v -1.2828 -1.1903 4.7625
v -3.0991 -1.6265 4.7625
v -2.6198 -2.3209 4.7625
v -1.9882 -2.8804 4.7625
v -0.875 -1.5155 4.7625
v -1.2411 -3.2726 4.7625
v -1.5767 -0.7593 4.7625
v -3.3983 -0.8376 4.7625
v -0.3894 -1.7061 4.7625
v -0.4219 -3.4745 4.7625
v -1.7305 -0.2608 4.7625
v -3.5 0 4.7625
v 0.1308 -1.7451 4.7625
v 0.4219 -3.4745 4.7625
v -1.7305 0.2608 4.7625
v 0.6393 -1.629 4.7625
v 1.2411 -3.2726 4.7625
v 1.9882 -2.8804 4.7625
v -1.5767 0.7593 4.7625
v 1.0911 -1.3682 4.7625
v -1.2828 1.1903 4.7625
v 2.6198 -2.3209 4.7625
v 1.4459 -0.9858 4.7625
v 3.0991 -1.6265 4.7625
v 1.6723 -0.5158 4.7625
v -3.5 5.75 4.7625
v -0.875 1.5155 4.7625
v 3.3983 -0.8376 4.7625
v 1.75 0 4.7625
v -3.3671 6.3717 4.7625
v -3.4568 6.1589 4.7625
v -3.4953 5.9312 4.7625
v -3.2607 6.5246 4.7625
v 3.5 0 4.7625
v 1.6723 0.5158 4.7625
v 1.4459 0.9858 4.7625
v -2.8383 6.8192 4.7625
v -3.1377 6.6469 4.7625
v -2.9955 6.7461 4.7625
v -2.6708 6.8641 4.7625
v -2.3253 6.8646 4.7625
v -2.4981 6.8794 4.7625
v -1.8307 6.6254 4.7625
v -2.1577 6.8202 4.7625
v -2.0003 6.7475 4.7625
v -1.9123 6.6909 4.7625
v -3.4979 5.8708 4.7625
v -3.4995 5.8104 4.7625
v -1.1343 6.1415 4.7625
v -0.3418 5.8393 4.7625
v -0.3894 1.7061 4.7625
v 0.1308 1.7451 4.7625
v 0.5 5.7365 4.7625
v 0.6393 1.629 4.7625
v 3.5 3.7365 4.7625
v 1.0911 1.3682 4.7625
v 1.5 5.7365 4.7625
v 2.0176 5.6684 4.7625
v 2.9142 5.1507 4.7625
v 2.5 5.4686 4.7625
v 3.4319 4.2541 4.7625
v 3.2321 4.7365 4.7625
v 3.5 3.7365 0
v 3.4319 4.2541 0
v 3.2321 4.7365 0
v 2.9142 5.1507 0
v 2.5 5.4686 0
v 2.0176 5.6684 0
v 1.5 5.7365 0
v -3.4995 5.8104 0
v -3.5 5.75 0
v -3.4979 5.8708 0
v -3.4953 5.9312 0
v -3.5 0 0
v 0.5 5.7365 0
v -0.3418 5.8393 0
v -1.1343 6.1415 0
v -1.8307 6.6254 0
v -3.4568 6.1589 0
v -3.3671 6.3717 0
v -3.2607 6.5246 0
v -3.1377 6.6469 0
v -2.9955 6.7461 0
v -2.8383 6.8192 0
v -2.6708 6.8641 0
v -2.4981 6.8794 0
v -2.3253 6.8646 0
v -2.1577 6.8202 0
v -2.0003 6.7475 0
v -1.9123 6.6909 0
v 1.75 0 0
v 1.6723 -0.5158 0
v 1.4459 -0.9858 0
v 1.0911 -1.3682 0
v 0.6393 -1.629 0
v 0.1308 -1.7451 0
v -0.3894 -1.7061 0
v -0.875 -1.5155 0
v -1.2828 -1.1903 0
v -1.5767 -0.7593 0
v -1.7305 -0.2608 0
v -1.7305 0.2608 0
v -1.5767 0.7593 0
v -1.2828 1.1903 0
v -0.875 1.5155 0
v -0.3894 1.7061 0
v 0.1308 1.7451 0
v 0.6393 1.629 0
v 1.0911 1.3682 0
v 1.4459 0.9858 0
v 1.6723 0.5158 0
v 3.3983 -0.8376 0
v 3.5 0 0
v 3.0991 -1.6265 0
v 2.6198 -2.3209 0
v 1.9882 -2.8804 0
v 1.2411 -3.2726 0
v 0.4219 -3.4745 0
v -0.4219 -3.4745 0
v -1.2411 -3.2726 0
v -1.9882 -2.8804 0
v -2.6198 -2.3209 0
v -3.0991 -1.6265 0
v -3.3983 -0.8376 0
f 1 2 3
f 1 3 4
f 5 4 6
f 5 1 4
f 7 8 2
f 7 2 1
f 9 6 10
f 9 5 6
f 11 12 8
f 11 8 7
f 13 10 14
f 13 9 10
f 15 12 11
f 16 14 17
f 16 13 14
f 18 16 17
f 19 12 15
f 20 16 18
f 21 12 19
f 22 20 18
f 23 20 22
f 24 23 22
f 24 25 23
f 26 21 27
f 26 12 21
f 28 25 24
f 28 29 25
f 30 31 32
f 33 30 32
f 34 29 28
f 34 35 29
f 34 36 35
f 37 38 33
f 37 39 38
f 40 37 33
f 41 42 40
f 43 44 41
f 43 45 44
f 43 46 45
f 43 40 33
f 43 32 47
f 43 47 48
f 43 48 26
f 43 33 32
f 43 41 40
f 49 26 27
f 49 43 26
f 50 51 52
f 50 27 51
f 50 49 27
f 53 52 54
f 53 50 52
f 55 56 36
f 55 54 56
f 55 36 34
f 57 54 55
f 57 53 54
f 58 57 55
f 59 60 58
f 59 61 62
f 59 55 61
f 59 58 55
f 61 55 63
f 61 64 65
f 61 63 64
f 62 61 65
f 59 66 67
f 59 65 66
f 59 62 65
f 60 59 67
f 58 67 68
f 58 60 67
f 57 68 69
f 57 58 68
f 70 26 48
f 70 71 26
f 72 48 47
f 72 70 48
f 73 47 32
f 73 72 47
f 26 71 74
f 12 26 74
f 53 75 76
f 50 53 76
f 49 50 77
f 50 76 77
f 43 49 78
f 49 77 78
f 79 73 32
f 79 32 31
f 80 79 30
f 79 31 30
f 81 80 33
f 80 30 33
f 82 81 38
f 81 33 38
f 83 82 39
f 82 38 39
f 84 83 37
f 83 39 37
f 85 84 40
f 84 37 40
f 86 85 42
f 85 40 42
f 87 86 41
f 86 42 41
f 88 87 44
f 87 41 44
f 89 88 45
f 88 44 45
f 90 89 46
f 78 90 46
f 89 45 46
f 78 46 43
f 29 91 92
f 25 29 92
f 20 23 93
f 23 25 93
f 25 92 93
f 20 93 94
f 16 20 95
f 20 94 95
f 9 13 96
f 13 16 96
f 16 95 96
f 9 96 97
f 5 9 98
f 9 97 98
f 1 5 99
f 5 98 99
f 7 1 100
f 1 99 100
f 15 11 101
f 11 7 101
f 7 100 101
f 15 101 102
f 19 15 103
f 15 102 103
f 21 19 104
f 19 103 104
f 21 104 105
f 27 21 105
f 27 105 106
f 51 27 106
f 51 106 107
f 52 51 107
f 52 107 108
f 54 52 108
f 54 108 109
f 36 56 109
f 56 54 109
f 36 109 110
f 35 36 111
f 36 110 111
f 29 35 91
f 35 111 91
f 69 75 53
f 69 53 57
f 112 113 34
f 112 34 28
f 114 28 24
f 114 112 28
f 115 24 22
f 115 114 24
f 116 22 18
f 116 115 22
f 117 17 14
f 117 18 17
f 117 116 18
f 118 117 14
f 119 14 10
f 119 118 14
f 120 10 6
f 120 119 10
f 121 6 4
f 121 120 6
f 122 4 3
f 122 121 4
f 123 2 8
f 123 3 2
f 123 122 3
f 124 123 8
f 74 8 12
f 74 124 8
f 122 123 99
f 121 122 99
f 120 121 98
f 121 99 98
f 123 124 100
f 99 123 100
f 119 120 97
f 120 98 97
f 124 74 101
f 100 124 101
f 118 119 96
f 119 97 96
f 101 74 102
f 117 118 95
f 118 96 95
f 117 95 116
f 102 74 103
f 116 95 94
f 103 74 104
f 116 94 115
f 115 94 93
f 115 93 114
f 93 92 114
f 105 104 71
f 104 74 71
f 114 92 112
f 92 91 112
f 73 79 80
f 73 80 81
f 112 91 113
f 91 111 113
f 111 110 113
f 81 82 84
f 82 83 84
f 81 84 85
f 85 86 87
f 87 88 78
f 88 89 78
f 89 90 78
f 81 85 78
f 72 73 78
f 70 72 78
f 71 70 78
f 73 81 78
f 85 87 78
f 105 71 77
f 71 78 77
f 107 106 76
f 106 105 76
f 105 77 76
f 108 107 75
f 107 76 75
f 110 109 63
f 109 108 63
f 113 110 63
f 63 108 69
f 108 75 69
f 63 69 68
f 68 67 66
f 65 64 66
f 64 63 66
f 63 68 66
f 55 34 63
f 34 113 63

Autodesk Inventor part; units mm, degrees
ref_plane "YZ Plane" through (0, 0, 0) normal (1, 0, 0) x (0, 1, 0)
ref_plane "XZ Plane" through (0, 0, 0) normal (0, 1, 0) x (-1, 0, 0)
ref_plane "XY Plane" through (0, 0, 0) normal (0, 0, 1) x (1, 0, 0)
sketch "Sketch1" plane through (0, 0, 0) normal (0, 0, 1) x (1, 0, 0)
  circle A0 centre (0, 0) radius 1.75
  circle A1 centre (0, 0) radius 3.5
  circle A2 centre (0, 0) radius 5.75 construction
  line L0 (0, 0) -> (0, 5.75) construction
  circle A3 centre (0.5, 9.2365) radius 3.5
  line L1 (0, 0) -> (0, 5.75) construction
  line L2 (3.5, 0) -> (3.5, 5.75)
  line L3 (-3.5, 5.75) -> (-3.5, 0)
  arc A4 (-3.5, 0) -> (3.5, 0) centre (0, 0) ccw
  arc A5 (3.5, 5.75) -> (-1.9961, 2.875) centre (0, 5.75) ccw
  arc A6 (-3.4062, 0.805) -> (-3.4062, 4.945) centre (-12.1649, 2.875) ccw
  line L4 (0.5, 5.7365) -> (3.5, 5.7365)
  point P0 (0, 2.875)
  point P1 (-3.4345, 6.424)
  point P2 (3.5, 0)
  point P3 (3.244, 7.0639)
  point P4 (-3.5, 0)
  point P5 (-2.744, 7.9226)
  dimension "d2" = 11.5
  dimension "d3" = 7
  dimension "d0" = 3.5
  dimension "d1" = 7
  dimension "d4" = 3.5
  dimension "d9" = 0.5
  dimension "d10" = 9
extrude "Extrusion1" add sketch "Sketch1" along normal blind 4.7625 contours A1 | A1 A5 A3 L4 L2 | A1 A6 A5 | L3 A5 A6 A1
fillet "Fillet1" radius 1 1 edges at (-2.744, 7.9226, 2.3813)
fillet "Fillet2" radius 2 1 edges at (3.5, 5.7365, 2.3813)
sketch "Sketch2" plane through (0, 0, 0) normal (0, 0, -1) x (-1, 0, 0)
  line L0 (-3.5, 0) -> (-3.5, 3.7365) projected
  arc A0 (-3.5, 0) -> (3.5, 0) centre (0, 0) ccw projected
  circle A1 centre (0, 0) radius 1.75 projected
  circle A2 centre (0, 0) radius 6.0263 construction
  arc A3 (3.4953, 5.9311) -> (1.8307, 6.6254) centre (2.4966, 5.8794) ccw projected
  arc A4 (-0.5, 5.7365) -> (1.8307, 6.6254) centre (-0.5, 9.2365) ccw projected
  line L1 (3.5, 5.75) -> (3.5, 0) projected
  line L2 (-1.5, 5.7365) -> (-0.5, 5.7365) projected
  arc A5 (-1.5, 5.7365) -> (-3.5, 3.7365) centre (-1.5, 3.7365) ccw projected
  arc A6 (-1.5, 5.7365) -> (-3.5, 3.7365) centre (-1.5, 3.7365) ccw projected
  arc A7 (3.5, 5.75) -> (3.4953, 5.9311) centre (0, 5.75) ccw projected
equation "\"d4\" = 0.5 * d1"
properties part number "Cam - Lever" material "Nylon 6/6"
